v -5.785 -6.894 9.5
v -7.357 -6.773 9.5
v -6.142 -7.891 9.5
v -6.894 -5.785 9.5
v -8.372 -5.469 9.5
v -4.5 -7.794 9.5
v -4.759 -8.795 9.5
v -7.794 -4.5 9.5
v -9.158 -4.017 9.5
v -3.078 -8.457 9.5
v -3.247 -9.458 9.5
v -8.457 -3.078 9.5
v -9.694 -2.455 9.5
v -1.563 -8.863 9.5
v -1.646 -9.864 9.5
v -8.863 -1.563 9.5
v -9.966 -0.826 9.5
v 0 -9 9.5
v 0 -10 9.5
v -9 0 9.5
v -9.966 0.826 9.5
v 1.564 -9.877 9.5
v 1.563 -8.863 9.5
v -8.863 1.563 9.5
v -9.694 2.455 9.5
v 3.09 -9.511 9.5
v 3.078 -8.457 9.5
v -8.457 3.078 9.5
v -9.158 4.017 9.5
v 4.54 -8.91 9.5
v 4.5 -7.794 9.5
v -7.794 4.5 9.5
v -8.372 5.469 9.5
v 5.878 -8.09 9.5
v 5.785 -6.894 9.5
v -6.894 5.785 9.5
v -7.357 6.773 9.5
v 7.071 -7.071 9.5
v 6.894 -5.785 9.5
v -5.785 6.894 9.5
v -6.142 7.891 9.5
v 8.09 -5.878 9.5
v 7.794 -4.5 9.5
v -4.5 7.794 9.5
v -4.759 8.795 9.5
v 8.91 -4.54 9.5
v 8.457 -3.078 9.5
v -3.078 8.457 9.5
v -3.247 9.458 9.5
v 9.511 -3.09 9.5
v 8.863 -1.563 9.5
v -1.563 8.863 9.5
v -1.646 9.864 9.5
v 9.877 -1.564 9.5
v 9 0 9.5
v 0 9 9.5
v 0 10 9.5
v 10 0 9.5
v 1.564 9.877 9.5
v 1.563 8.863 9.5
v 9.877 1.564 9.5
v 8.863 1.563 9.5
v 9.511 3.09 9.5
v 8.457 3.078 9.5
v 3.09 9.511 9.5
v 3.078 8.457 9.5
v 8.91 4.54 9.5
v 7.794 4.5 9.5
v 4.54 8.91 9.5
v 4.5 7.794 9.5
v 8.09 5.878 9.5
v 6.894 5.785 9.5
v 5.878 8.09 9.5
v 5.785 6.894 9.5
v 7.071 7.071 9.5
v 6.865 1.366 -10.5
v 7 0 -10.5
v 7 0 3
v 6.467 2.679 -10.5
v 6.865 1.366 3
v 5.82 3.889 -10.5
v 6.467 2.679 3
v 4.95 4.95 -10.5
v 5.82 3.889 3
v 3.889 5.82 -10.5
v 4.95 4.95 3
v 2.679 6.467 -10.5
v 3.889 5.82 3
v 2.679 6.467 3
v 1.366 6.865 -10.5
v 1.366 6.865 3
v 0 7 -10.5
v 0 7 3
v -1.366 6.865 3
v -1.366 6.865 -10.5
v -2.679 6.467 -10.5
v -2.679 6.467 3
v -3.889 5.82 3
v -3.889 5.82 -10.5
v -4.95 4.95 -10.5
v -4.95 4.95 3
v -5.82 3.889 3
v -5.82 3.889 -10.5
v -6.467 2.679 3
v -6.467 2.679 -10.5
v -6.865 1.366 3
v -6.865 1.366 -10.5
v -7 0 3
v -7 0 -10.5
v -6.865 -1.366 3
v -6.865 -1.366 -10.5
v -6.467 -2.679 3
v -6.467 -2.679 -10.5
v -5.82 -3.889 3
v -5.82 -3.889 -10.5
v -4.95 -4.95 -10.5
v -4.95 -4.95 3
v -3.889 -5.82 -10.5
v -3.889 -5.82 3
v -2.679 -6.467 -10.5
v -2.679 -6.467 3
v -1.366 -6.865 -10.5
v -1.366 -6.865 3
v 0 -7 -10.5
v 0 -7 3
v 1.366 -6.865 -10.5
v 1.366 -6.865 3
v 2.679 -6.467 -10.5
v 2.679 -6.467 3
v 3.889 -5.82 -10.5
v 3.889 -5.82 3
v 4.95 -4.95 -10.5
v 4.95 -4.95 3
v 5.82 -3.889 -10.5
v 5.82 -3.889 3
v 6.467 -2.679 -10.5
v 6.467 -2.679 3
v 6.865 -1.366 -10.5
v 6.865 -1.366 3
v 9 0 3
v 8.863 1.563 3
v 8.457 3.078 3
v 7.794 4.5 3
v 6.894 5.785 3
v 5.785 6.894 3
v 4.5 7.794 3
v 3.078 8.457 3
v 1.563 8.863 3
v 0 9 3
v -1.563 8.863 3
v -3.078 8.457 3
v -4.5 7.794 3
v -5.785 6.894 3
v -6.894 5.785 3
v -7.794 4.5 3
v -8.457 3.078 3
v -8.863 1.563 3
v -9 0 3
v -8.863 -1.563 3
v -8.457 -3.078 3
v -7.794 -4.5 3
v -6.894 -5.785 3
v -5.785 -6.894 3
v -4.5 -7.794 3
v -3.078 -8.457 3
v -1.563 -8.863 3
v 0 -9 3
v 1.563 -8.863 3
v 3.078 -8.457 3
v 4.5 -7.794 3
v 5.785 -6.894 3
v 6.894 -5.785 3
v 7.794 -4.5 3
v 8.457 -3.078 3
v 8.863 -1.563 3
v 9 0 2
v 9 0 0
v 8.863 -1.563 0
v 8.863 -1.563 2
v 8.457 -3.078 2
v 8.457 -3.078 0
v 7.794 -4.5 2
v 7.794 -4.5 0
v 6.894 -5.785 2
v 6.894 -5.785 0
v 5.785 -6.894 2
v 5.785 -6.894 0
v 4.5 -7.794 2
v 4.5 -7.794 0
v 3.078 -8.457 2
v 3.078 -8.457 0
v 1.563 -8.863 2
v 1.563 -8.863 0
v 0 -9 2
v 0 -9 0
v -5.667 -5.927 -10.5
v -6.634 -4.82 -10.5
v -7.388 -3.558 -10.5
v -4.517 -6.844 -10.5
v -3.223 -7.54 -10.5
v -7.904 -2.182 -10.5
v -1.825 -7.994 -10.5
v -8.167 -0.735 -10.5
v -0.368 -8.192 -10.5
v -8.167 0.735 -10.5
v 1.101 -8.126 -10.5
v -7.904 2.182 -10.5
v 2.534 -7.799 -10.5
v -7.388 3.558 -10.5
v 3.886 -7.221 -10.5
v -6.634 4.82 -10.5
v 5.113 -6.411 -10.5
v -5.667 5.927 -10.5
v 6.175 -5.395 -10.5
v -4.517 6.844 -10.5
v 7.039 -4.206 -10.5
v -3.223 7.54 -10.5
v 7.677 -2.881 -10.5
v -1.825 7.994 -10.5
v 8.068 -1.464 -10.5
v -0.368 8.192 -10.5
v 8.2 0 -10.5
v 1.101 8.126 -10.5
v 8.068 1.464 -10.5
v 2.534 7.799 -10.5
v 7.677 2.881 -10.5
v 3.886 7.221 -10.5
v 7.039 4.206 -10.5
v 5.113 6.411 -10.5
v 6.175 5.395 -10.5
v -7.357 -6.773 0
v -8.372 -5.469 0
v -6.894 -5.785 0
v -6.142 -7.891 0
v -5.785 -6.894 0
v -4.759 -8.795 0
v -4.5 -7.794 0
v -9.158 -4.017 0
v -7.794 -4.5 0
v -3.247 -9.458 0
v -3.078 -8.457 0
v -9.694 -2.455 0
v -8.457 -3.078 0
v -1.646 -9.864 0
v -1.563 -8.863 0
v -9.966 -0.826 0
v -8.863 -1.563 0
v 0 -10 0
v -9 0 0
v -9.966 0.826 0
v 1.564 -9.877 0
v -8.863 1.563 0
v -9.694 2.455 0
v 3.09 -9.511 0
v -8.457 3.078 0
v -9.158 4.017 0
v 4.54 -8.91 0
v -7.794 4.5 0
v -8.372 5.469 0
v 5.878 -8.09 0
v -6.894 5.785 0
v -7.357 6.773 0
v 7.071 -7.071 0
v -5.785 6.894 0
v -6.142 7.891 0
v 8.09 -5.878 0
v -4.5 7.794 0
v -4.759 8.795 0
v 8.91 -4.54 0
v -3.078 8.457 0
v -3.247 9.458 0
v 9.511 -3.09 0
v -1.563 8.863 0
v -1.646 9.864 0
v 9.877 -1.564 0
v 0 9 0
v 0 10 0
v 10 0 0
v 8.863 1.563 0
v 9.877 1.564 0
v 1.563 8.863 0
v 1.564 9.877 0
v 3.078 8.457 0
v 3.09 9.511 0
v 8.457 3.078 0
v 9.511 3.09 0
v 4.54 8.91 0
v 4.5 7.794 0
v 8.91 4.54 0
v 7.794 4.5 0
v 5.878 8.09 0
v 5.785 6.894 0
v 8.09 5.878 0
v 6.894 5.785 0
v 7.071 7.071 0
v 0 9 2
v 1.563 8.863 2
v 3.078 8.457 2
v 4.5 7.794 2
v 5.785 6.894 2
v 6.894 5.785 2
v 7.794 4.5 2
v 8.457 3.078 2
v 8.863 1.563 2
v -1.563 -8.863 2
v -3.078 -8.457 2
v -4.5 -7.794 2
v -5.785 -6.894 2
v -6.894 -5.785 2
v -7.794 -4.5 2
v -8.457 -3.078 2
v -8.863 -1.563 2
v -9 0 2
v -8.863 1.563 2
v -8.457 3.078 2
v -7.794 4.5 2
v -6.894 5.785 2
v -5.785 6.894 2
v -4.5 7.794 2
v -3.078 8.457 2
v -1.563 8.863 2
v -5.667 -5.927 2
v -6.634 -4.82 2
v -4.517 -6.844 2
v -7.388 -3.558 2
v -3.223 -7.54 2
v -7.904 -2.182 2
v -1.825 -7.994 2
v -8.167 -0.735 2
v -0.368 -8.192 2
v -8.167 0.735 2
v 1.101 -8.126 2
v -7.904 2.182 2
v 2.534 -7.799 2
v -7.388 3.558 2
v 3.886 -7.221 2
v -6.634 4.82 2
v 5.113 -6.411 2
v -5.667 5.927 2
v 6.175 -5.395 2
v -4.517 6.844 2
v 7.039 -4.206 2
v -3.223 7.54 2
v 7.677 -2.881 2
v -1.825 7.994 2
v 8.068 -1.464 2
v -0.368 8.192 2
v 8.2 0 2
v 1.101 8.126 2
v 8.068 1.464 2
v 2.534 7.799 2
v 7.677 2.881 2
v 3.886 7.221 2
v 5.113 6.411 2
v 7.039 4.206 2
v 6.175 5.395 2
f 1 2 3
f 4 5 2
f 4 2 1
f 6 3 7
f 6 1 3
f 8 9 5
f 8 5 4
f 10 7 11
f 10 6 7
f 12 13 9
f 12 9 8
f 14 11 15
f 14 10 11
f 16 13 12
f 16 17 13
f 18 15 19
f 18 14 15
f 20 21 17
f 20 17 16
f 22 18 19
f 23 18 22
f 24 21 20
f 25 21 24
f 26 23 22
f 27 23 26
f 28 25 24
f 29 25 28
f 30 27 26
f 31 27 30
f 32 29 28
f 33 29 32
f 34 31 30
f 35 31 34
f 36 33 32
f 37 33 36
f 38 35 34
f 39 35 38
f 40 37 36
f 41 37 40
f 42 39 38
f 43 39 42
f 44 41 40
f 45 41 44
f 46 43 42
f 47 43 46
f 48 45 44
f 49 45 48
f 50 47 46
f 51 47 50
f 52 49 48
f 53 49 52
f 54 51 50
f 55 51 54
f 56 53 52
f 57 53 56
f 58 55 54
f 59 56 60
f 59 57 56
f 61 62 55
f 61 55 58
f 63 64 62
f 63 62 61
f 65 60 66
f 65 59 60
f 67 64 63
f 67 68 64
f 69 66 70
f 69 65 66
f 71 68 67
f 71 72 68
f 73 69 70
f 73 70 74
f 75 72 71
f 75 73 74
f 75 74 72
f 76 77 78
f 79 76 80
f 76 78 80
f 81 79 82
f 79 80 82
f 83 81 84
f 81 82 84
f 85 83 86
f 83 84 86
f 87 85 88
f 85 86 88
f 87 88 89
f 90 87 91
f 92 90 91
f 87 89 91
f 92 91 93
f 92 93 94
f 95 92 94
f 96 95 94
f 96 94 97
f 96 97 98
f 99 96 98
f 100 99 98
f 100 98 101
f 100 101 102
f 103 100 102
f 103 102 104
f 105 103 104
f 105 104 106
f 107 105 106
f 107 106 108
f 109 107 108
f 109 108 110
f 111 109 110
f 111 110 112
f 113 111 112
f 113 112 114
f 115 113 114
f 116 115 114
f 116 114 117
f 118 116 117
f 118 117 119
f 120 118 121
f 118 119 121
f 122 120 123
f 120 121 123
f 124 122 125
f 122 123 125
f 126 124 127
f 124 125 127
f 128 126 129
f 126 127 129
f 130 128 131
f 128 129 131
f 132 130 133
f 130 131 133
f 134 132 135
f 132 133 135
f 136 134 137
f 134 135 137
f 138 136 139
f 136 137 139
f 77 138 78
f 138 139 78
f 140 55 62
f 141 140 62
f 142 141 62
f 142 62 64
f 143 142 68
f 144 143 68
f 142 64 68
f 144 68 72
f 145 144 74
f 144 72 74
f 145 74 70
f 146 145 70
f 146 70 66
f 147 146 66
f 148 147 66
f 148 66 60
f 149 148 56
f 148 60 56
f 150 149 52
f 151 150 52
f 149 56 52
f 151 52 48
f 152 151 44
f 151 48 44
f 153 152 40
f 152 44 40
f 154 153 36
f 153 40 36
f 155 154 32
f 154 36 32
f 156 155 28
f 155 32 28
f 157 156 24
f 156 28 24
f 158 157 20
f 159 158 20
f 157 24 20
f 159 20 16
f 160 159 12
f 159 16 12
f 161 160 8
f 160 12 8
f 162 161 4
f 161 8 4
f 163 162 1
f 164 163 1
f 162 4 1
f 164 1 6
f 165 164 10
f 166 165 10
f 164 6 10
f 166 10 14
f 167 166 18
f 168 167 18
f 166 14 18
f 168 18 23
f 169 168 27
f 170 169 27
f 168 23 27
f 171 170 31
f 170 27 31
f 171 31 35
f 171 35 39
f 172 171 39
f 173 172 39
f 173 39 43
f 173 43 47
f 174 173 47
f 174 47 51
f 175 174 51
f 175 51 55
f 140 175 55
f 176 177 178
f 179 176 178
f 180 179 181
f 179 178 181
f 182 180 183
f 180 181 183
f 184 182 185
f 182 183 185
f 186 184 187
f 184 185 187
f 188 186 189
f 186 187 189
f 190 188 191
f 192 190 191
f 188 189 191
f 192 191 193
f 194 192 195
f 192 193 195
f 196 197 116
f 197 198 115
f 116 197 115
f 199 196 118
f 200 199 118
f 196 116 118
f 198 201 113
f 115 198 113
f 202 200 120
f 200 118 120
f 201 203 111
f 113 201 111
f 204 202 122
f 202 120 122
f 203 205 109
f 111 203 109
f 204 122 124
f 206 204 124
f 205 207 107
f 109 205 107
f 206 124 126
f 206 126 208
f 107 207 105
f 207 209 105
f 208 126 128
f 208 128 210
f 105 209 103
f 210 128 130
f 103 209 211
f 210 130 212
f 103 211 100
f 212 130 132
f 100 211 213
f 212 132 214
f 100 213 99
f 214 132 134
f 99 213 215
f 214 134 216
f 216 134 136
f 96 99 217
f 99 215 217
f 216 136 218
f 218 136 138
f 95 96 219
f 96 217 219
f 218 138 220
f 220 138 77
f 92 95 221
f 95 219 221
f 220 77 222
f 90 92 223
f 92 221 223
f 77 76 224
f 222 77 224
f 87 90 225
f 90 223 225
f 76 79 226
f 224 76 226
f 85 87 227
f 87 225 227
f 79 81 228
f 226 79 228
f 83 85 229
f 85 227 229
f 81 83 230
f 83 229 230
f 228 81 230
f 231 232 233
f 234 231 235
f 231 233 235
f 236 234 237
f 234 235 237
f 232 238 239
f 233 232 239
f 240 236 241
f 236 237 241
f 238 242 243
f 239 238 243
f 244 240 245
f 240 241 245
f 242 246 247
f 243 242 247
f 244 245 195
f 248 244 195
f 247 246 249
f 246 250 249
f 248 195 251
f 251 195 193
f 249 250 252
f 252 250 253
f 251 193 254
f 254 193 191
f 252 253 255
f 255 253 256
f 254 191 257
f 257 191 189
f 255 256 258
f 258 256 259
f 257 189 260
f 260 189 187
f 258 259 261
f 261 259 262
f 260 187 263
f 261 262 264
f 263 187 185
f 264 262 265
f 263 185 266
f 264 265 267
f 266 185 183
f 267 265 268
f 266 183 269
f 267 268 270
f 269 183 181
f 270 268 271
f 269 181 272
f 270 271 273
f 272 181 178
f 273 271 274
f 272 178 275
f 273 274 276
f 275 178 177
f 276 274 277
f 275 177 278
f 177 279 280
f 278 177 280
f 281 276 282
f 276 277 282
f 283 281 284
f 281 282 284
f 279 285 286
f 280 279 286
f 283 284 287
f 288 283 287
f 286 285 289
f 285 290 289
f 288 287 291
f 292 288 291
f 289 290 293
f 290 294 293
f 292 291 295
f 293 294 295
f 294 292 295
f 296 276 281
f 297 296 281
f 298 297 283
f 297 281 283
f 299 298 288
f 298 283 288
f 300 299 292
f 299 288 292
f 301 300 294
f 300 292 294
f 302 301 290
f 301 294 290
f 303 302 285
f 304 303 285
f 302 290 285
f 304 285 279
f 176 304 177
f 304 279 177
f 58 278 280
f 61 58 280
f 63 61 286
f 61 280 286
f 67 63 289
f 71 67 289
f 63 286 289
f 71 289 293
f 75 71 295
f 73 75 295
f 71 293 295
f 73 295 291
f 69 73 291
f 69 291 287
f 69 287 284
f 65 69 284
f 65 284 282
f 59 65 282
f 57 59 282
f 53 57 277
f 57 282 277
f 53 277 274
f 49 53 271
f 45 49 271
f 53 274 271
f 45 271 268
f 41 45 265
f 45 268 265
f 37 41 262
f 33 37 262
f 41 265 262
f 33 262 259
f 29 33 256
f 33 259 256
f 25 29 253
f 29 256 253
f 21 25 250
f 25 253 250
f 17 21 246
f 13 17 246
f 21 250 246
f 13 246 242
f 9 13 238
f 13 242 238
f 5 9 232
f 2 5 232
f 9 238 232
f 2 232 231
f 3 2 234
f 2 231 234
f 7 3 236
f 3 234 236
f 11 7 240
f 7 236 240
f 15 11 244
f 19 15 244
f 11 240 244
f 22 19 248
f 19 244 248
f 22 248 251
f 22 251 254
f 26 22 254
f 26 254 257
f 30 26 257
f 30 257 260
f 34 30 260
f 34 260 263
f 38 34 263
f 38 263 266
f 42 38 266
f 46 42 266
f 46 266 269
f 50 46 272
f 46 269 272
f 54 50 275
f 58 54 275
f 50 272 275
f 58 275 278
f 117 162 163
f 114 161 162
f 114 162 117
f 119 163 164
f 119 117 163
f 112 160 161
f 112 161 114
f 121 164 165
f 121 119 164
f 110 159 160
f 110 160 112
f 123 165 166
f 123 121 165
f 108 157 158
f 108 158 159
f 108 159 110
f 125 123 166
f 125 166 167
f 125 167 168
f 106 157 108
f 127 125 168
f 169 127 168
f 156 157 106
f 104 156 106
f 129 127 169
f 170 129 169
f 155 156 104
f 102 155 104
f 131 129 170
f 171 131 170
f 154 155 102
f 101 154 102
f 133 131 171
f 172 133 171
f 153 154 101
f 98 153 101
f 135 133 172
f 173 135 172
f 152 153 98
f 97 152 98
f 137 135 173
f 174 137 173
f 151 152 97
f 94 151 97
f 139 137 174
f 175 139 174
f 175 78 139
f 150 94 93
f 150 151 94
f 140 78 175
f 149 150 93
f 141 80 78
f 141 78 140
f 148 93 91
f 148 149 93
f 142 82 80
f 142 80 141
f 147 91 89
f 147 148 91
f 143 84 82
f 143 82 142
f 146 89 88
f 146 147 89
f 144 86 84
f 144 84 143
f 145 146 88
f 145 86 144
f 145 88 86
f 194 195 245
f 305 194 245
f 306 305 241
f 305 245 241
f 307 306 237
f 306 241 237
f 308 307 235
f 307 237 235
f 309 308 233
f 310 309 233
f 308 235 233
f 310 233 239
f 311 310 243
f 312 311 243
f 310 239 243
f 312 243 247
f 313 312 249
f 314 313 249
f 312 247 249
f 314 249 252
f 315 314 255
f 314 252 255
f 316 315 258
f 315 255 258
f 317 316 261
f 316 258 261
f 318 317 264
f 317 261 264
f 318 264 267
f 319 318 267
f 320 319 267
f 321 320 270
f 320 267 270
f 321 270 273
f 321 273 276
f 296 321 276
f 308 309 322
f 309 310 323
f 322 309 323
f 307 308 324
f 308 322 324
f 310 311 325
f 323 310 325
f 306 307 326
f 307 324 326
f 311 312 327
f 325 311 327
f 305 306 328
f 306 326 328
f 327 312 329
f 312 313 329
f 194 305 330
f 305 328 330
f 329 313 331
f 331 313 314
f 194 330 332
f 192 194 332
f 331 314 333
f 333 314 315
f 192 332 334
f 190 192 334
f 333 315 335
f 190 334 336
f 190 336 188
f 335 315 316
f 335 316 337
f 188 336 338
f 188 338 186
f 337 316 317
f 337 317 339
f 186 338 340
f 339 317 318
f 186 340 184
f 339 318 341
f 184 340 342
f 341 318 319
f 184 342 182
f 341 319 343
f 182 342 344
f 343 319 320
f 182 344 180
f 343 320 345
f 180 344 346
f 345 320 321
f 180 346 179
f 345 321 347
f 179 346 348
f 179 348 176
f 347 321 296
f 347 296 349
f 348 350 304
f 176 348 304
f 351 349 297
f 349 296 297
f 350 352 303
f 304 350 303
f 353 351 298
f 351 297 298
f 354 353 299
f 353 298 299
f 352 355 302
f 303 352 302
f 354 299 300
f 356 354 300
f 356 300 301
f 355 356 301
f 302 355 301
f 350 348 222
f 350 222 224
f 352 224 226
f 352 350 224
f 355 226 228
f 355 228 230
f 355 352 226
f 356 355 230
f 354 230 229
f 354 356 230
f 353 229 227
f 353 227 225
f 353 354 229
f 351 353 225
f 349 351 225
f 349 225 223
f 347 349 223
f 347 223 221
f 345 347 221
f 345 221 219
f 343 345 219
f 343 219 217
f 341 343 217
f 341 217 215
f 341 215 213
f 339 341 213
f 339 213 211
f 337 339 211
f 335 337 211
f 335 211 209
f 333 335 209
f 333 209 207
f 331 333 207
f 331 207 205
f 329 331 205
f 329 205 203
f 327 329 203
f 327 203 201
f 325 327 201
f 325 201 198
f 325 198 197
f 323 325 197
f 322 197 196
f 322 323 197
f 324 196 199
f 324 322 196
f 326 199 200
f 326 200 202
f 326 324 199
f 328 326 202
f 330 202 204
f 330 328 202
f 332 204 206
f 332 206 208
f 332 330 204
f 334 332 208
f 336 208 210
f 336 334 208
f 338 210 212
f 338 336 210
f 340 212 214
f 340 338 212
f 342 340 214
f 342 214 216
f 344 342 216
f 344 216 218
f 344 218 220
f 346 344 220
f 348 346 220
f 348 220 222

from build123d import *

# Parameters (mm, degrees)
F1_DEPTH = 2
F2_DEPTH = 3
F3_R     = 8.2
F4_DEPTH = 7.5
F5_R     = 8.2
F5_R_2   = 7
F6_DEPTH = 20
F7_R     = 9
F7_R_2   = 7
F8_DEPTH = 6.5


with BuildPart() as f1:
    # F0 (on Top) → F1 (new body)
    with BuildSketch(Plane.XY):
        with BuildLine():
            Line((0, 9), (0, 10))
            ThreePointArc((0, 10), (-10, 0), (0, -10))
            Line((0, -10), (0, -9))
            ThreePointArc((0, -9), (-9, 0), (0, 9))
        make_face()
    extrude(amount=F1_DEPTH)

    # F0 (on Top) → F2 (join)
    with BuildSketch(Plane.XY):
        with BuildLine():
            ThreePointArc((0, -10), (7.0710678119, -7.0710678119), (10, 0))
            ThreePointArc((10, 0), (7.0710678119, 7.0710678119), (0, 10))
            Line((0, 10), (0, 9))
            ThreePointArc((0, 9), (6.3639610307, 6.3639610307), (9, 0))
            ThreePointArc((9, 0), (6.3639610307, -6.3639610307), (0, -9))
            Line((0, -9), (0, -10))
        make_face()
    extrude(amount=F2_DEPTH)

    # F3 (on face) → F4 (join)
    with BuildSketch(Plane.XY.offset(2)):
        with BuildLine():
            Line((0, 9), (0, 10))
            ThreePointArc((0, 10), (-10, 0), (0, -10))
            Line((0, -10), (0, -9))
            ThreePointArc((0, -9), (-9, 0), (0, 9))
        make_face()
        with BuildLine():
            ThreePointArc((0, -10), (7.0710678119, -7.0710678119), (10, 0))
            ThreePointArc((10, 0), (7.0710678119, 7.0710678119), (0, 10))
            Line((0, 10), (0, 9))
            ThreePointArc((0, 9), (-9, 0), (0, -9))
            Line((0, -9), (0, -10))
        make_face()
        Circle(F3_R, mode=Mode.SUBTRACT)
    extrude(amount=F4_DEPTH)

    # F5 (on face) → F6 (join)
    with BuildSketch(Plane.XY.offset(9.5)):
        Circle(F5_R)
        Circle(F5_R_2, mode=Mode.SUBTRACT)
    extrude(amount=-F6_DEPTH)

    # F7 (on face) → F8 (cut)
    with BuildSketch(Plane.XY.offset(9.5)):
        Circle(F7_R)
        Circle(F7_R_2, mode=Mode.SUBTRACT)
    extrude(amount=-F8_DEPTH, mode=Mode.SUBTRACT)


solid = f1.part
